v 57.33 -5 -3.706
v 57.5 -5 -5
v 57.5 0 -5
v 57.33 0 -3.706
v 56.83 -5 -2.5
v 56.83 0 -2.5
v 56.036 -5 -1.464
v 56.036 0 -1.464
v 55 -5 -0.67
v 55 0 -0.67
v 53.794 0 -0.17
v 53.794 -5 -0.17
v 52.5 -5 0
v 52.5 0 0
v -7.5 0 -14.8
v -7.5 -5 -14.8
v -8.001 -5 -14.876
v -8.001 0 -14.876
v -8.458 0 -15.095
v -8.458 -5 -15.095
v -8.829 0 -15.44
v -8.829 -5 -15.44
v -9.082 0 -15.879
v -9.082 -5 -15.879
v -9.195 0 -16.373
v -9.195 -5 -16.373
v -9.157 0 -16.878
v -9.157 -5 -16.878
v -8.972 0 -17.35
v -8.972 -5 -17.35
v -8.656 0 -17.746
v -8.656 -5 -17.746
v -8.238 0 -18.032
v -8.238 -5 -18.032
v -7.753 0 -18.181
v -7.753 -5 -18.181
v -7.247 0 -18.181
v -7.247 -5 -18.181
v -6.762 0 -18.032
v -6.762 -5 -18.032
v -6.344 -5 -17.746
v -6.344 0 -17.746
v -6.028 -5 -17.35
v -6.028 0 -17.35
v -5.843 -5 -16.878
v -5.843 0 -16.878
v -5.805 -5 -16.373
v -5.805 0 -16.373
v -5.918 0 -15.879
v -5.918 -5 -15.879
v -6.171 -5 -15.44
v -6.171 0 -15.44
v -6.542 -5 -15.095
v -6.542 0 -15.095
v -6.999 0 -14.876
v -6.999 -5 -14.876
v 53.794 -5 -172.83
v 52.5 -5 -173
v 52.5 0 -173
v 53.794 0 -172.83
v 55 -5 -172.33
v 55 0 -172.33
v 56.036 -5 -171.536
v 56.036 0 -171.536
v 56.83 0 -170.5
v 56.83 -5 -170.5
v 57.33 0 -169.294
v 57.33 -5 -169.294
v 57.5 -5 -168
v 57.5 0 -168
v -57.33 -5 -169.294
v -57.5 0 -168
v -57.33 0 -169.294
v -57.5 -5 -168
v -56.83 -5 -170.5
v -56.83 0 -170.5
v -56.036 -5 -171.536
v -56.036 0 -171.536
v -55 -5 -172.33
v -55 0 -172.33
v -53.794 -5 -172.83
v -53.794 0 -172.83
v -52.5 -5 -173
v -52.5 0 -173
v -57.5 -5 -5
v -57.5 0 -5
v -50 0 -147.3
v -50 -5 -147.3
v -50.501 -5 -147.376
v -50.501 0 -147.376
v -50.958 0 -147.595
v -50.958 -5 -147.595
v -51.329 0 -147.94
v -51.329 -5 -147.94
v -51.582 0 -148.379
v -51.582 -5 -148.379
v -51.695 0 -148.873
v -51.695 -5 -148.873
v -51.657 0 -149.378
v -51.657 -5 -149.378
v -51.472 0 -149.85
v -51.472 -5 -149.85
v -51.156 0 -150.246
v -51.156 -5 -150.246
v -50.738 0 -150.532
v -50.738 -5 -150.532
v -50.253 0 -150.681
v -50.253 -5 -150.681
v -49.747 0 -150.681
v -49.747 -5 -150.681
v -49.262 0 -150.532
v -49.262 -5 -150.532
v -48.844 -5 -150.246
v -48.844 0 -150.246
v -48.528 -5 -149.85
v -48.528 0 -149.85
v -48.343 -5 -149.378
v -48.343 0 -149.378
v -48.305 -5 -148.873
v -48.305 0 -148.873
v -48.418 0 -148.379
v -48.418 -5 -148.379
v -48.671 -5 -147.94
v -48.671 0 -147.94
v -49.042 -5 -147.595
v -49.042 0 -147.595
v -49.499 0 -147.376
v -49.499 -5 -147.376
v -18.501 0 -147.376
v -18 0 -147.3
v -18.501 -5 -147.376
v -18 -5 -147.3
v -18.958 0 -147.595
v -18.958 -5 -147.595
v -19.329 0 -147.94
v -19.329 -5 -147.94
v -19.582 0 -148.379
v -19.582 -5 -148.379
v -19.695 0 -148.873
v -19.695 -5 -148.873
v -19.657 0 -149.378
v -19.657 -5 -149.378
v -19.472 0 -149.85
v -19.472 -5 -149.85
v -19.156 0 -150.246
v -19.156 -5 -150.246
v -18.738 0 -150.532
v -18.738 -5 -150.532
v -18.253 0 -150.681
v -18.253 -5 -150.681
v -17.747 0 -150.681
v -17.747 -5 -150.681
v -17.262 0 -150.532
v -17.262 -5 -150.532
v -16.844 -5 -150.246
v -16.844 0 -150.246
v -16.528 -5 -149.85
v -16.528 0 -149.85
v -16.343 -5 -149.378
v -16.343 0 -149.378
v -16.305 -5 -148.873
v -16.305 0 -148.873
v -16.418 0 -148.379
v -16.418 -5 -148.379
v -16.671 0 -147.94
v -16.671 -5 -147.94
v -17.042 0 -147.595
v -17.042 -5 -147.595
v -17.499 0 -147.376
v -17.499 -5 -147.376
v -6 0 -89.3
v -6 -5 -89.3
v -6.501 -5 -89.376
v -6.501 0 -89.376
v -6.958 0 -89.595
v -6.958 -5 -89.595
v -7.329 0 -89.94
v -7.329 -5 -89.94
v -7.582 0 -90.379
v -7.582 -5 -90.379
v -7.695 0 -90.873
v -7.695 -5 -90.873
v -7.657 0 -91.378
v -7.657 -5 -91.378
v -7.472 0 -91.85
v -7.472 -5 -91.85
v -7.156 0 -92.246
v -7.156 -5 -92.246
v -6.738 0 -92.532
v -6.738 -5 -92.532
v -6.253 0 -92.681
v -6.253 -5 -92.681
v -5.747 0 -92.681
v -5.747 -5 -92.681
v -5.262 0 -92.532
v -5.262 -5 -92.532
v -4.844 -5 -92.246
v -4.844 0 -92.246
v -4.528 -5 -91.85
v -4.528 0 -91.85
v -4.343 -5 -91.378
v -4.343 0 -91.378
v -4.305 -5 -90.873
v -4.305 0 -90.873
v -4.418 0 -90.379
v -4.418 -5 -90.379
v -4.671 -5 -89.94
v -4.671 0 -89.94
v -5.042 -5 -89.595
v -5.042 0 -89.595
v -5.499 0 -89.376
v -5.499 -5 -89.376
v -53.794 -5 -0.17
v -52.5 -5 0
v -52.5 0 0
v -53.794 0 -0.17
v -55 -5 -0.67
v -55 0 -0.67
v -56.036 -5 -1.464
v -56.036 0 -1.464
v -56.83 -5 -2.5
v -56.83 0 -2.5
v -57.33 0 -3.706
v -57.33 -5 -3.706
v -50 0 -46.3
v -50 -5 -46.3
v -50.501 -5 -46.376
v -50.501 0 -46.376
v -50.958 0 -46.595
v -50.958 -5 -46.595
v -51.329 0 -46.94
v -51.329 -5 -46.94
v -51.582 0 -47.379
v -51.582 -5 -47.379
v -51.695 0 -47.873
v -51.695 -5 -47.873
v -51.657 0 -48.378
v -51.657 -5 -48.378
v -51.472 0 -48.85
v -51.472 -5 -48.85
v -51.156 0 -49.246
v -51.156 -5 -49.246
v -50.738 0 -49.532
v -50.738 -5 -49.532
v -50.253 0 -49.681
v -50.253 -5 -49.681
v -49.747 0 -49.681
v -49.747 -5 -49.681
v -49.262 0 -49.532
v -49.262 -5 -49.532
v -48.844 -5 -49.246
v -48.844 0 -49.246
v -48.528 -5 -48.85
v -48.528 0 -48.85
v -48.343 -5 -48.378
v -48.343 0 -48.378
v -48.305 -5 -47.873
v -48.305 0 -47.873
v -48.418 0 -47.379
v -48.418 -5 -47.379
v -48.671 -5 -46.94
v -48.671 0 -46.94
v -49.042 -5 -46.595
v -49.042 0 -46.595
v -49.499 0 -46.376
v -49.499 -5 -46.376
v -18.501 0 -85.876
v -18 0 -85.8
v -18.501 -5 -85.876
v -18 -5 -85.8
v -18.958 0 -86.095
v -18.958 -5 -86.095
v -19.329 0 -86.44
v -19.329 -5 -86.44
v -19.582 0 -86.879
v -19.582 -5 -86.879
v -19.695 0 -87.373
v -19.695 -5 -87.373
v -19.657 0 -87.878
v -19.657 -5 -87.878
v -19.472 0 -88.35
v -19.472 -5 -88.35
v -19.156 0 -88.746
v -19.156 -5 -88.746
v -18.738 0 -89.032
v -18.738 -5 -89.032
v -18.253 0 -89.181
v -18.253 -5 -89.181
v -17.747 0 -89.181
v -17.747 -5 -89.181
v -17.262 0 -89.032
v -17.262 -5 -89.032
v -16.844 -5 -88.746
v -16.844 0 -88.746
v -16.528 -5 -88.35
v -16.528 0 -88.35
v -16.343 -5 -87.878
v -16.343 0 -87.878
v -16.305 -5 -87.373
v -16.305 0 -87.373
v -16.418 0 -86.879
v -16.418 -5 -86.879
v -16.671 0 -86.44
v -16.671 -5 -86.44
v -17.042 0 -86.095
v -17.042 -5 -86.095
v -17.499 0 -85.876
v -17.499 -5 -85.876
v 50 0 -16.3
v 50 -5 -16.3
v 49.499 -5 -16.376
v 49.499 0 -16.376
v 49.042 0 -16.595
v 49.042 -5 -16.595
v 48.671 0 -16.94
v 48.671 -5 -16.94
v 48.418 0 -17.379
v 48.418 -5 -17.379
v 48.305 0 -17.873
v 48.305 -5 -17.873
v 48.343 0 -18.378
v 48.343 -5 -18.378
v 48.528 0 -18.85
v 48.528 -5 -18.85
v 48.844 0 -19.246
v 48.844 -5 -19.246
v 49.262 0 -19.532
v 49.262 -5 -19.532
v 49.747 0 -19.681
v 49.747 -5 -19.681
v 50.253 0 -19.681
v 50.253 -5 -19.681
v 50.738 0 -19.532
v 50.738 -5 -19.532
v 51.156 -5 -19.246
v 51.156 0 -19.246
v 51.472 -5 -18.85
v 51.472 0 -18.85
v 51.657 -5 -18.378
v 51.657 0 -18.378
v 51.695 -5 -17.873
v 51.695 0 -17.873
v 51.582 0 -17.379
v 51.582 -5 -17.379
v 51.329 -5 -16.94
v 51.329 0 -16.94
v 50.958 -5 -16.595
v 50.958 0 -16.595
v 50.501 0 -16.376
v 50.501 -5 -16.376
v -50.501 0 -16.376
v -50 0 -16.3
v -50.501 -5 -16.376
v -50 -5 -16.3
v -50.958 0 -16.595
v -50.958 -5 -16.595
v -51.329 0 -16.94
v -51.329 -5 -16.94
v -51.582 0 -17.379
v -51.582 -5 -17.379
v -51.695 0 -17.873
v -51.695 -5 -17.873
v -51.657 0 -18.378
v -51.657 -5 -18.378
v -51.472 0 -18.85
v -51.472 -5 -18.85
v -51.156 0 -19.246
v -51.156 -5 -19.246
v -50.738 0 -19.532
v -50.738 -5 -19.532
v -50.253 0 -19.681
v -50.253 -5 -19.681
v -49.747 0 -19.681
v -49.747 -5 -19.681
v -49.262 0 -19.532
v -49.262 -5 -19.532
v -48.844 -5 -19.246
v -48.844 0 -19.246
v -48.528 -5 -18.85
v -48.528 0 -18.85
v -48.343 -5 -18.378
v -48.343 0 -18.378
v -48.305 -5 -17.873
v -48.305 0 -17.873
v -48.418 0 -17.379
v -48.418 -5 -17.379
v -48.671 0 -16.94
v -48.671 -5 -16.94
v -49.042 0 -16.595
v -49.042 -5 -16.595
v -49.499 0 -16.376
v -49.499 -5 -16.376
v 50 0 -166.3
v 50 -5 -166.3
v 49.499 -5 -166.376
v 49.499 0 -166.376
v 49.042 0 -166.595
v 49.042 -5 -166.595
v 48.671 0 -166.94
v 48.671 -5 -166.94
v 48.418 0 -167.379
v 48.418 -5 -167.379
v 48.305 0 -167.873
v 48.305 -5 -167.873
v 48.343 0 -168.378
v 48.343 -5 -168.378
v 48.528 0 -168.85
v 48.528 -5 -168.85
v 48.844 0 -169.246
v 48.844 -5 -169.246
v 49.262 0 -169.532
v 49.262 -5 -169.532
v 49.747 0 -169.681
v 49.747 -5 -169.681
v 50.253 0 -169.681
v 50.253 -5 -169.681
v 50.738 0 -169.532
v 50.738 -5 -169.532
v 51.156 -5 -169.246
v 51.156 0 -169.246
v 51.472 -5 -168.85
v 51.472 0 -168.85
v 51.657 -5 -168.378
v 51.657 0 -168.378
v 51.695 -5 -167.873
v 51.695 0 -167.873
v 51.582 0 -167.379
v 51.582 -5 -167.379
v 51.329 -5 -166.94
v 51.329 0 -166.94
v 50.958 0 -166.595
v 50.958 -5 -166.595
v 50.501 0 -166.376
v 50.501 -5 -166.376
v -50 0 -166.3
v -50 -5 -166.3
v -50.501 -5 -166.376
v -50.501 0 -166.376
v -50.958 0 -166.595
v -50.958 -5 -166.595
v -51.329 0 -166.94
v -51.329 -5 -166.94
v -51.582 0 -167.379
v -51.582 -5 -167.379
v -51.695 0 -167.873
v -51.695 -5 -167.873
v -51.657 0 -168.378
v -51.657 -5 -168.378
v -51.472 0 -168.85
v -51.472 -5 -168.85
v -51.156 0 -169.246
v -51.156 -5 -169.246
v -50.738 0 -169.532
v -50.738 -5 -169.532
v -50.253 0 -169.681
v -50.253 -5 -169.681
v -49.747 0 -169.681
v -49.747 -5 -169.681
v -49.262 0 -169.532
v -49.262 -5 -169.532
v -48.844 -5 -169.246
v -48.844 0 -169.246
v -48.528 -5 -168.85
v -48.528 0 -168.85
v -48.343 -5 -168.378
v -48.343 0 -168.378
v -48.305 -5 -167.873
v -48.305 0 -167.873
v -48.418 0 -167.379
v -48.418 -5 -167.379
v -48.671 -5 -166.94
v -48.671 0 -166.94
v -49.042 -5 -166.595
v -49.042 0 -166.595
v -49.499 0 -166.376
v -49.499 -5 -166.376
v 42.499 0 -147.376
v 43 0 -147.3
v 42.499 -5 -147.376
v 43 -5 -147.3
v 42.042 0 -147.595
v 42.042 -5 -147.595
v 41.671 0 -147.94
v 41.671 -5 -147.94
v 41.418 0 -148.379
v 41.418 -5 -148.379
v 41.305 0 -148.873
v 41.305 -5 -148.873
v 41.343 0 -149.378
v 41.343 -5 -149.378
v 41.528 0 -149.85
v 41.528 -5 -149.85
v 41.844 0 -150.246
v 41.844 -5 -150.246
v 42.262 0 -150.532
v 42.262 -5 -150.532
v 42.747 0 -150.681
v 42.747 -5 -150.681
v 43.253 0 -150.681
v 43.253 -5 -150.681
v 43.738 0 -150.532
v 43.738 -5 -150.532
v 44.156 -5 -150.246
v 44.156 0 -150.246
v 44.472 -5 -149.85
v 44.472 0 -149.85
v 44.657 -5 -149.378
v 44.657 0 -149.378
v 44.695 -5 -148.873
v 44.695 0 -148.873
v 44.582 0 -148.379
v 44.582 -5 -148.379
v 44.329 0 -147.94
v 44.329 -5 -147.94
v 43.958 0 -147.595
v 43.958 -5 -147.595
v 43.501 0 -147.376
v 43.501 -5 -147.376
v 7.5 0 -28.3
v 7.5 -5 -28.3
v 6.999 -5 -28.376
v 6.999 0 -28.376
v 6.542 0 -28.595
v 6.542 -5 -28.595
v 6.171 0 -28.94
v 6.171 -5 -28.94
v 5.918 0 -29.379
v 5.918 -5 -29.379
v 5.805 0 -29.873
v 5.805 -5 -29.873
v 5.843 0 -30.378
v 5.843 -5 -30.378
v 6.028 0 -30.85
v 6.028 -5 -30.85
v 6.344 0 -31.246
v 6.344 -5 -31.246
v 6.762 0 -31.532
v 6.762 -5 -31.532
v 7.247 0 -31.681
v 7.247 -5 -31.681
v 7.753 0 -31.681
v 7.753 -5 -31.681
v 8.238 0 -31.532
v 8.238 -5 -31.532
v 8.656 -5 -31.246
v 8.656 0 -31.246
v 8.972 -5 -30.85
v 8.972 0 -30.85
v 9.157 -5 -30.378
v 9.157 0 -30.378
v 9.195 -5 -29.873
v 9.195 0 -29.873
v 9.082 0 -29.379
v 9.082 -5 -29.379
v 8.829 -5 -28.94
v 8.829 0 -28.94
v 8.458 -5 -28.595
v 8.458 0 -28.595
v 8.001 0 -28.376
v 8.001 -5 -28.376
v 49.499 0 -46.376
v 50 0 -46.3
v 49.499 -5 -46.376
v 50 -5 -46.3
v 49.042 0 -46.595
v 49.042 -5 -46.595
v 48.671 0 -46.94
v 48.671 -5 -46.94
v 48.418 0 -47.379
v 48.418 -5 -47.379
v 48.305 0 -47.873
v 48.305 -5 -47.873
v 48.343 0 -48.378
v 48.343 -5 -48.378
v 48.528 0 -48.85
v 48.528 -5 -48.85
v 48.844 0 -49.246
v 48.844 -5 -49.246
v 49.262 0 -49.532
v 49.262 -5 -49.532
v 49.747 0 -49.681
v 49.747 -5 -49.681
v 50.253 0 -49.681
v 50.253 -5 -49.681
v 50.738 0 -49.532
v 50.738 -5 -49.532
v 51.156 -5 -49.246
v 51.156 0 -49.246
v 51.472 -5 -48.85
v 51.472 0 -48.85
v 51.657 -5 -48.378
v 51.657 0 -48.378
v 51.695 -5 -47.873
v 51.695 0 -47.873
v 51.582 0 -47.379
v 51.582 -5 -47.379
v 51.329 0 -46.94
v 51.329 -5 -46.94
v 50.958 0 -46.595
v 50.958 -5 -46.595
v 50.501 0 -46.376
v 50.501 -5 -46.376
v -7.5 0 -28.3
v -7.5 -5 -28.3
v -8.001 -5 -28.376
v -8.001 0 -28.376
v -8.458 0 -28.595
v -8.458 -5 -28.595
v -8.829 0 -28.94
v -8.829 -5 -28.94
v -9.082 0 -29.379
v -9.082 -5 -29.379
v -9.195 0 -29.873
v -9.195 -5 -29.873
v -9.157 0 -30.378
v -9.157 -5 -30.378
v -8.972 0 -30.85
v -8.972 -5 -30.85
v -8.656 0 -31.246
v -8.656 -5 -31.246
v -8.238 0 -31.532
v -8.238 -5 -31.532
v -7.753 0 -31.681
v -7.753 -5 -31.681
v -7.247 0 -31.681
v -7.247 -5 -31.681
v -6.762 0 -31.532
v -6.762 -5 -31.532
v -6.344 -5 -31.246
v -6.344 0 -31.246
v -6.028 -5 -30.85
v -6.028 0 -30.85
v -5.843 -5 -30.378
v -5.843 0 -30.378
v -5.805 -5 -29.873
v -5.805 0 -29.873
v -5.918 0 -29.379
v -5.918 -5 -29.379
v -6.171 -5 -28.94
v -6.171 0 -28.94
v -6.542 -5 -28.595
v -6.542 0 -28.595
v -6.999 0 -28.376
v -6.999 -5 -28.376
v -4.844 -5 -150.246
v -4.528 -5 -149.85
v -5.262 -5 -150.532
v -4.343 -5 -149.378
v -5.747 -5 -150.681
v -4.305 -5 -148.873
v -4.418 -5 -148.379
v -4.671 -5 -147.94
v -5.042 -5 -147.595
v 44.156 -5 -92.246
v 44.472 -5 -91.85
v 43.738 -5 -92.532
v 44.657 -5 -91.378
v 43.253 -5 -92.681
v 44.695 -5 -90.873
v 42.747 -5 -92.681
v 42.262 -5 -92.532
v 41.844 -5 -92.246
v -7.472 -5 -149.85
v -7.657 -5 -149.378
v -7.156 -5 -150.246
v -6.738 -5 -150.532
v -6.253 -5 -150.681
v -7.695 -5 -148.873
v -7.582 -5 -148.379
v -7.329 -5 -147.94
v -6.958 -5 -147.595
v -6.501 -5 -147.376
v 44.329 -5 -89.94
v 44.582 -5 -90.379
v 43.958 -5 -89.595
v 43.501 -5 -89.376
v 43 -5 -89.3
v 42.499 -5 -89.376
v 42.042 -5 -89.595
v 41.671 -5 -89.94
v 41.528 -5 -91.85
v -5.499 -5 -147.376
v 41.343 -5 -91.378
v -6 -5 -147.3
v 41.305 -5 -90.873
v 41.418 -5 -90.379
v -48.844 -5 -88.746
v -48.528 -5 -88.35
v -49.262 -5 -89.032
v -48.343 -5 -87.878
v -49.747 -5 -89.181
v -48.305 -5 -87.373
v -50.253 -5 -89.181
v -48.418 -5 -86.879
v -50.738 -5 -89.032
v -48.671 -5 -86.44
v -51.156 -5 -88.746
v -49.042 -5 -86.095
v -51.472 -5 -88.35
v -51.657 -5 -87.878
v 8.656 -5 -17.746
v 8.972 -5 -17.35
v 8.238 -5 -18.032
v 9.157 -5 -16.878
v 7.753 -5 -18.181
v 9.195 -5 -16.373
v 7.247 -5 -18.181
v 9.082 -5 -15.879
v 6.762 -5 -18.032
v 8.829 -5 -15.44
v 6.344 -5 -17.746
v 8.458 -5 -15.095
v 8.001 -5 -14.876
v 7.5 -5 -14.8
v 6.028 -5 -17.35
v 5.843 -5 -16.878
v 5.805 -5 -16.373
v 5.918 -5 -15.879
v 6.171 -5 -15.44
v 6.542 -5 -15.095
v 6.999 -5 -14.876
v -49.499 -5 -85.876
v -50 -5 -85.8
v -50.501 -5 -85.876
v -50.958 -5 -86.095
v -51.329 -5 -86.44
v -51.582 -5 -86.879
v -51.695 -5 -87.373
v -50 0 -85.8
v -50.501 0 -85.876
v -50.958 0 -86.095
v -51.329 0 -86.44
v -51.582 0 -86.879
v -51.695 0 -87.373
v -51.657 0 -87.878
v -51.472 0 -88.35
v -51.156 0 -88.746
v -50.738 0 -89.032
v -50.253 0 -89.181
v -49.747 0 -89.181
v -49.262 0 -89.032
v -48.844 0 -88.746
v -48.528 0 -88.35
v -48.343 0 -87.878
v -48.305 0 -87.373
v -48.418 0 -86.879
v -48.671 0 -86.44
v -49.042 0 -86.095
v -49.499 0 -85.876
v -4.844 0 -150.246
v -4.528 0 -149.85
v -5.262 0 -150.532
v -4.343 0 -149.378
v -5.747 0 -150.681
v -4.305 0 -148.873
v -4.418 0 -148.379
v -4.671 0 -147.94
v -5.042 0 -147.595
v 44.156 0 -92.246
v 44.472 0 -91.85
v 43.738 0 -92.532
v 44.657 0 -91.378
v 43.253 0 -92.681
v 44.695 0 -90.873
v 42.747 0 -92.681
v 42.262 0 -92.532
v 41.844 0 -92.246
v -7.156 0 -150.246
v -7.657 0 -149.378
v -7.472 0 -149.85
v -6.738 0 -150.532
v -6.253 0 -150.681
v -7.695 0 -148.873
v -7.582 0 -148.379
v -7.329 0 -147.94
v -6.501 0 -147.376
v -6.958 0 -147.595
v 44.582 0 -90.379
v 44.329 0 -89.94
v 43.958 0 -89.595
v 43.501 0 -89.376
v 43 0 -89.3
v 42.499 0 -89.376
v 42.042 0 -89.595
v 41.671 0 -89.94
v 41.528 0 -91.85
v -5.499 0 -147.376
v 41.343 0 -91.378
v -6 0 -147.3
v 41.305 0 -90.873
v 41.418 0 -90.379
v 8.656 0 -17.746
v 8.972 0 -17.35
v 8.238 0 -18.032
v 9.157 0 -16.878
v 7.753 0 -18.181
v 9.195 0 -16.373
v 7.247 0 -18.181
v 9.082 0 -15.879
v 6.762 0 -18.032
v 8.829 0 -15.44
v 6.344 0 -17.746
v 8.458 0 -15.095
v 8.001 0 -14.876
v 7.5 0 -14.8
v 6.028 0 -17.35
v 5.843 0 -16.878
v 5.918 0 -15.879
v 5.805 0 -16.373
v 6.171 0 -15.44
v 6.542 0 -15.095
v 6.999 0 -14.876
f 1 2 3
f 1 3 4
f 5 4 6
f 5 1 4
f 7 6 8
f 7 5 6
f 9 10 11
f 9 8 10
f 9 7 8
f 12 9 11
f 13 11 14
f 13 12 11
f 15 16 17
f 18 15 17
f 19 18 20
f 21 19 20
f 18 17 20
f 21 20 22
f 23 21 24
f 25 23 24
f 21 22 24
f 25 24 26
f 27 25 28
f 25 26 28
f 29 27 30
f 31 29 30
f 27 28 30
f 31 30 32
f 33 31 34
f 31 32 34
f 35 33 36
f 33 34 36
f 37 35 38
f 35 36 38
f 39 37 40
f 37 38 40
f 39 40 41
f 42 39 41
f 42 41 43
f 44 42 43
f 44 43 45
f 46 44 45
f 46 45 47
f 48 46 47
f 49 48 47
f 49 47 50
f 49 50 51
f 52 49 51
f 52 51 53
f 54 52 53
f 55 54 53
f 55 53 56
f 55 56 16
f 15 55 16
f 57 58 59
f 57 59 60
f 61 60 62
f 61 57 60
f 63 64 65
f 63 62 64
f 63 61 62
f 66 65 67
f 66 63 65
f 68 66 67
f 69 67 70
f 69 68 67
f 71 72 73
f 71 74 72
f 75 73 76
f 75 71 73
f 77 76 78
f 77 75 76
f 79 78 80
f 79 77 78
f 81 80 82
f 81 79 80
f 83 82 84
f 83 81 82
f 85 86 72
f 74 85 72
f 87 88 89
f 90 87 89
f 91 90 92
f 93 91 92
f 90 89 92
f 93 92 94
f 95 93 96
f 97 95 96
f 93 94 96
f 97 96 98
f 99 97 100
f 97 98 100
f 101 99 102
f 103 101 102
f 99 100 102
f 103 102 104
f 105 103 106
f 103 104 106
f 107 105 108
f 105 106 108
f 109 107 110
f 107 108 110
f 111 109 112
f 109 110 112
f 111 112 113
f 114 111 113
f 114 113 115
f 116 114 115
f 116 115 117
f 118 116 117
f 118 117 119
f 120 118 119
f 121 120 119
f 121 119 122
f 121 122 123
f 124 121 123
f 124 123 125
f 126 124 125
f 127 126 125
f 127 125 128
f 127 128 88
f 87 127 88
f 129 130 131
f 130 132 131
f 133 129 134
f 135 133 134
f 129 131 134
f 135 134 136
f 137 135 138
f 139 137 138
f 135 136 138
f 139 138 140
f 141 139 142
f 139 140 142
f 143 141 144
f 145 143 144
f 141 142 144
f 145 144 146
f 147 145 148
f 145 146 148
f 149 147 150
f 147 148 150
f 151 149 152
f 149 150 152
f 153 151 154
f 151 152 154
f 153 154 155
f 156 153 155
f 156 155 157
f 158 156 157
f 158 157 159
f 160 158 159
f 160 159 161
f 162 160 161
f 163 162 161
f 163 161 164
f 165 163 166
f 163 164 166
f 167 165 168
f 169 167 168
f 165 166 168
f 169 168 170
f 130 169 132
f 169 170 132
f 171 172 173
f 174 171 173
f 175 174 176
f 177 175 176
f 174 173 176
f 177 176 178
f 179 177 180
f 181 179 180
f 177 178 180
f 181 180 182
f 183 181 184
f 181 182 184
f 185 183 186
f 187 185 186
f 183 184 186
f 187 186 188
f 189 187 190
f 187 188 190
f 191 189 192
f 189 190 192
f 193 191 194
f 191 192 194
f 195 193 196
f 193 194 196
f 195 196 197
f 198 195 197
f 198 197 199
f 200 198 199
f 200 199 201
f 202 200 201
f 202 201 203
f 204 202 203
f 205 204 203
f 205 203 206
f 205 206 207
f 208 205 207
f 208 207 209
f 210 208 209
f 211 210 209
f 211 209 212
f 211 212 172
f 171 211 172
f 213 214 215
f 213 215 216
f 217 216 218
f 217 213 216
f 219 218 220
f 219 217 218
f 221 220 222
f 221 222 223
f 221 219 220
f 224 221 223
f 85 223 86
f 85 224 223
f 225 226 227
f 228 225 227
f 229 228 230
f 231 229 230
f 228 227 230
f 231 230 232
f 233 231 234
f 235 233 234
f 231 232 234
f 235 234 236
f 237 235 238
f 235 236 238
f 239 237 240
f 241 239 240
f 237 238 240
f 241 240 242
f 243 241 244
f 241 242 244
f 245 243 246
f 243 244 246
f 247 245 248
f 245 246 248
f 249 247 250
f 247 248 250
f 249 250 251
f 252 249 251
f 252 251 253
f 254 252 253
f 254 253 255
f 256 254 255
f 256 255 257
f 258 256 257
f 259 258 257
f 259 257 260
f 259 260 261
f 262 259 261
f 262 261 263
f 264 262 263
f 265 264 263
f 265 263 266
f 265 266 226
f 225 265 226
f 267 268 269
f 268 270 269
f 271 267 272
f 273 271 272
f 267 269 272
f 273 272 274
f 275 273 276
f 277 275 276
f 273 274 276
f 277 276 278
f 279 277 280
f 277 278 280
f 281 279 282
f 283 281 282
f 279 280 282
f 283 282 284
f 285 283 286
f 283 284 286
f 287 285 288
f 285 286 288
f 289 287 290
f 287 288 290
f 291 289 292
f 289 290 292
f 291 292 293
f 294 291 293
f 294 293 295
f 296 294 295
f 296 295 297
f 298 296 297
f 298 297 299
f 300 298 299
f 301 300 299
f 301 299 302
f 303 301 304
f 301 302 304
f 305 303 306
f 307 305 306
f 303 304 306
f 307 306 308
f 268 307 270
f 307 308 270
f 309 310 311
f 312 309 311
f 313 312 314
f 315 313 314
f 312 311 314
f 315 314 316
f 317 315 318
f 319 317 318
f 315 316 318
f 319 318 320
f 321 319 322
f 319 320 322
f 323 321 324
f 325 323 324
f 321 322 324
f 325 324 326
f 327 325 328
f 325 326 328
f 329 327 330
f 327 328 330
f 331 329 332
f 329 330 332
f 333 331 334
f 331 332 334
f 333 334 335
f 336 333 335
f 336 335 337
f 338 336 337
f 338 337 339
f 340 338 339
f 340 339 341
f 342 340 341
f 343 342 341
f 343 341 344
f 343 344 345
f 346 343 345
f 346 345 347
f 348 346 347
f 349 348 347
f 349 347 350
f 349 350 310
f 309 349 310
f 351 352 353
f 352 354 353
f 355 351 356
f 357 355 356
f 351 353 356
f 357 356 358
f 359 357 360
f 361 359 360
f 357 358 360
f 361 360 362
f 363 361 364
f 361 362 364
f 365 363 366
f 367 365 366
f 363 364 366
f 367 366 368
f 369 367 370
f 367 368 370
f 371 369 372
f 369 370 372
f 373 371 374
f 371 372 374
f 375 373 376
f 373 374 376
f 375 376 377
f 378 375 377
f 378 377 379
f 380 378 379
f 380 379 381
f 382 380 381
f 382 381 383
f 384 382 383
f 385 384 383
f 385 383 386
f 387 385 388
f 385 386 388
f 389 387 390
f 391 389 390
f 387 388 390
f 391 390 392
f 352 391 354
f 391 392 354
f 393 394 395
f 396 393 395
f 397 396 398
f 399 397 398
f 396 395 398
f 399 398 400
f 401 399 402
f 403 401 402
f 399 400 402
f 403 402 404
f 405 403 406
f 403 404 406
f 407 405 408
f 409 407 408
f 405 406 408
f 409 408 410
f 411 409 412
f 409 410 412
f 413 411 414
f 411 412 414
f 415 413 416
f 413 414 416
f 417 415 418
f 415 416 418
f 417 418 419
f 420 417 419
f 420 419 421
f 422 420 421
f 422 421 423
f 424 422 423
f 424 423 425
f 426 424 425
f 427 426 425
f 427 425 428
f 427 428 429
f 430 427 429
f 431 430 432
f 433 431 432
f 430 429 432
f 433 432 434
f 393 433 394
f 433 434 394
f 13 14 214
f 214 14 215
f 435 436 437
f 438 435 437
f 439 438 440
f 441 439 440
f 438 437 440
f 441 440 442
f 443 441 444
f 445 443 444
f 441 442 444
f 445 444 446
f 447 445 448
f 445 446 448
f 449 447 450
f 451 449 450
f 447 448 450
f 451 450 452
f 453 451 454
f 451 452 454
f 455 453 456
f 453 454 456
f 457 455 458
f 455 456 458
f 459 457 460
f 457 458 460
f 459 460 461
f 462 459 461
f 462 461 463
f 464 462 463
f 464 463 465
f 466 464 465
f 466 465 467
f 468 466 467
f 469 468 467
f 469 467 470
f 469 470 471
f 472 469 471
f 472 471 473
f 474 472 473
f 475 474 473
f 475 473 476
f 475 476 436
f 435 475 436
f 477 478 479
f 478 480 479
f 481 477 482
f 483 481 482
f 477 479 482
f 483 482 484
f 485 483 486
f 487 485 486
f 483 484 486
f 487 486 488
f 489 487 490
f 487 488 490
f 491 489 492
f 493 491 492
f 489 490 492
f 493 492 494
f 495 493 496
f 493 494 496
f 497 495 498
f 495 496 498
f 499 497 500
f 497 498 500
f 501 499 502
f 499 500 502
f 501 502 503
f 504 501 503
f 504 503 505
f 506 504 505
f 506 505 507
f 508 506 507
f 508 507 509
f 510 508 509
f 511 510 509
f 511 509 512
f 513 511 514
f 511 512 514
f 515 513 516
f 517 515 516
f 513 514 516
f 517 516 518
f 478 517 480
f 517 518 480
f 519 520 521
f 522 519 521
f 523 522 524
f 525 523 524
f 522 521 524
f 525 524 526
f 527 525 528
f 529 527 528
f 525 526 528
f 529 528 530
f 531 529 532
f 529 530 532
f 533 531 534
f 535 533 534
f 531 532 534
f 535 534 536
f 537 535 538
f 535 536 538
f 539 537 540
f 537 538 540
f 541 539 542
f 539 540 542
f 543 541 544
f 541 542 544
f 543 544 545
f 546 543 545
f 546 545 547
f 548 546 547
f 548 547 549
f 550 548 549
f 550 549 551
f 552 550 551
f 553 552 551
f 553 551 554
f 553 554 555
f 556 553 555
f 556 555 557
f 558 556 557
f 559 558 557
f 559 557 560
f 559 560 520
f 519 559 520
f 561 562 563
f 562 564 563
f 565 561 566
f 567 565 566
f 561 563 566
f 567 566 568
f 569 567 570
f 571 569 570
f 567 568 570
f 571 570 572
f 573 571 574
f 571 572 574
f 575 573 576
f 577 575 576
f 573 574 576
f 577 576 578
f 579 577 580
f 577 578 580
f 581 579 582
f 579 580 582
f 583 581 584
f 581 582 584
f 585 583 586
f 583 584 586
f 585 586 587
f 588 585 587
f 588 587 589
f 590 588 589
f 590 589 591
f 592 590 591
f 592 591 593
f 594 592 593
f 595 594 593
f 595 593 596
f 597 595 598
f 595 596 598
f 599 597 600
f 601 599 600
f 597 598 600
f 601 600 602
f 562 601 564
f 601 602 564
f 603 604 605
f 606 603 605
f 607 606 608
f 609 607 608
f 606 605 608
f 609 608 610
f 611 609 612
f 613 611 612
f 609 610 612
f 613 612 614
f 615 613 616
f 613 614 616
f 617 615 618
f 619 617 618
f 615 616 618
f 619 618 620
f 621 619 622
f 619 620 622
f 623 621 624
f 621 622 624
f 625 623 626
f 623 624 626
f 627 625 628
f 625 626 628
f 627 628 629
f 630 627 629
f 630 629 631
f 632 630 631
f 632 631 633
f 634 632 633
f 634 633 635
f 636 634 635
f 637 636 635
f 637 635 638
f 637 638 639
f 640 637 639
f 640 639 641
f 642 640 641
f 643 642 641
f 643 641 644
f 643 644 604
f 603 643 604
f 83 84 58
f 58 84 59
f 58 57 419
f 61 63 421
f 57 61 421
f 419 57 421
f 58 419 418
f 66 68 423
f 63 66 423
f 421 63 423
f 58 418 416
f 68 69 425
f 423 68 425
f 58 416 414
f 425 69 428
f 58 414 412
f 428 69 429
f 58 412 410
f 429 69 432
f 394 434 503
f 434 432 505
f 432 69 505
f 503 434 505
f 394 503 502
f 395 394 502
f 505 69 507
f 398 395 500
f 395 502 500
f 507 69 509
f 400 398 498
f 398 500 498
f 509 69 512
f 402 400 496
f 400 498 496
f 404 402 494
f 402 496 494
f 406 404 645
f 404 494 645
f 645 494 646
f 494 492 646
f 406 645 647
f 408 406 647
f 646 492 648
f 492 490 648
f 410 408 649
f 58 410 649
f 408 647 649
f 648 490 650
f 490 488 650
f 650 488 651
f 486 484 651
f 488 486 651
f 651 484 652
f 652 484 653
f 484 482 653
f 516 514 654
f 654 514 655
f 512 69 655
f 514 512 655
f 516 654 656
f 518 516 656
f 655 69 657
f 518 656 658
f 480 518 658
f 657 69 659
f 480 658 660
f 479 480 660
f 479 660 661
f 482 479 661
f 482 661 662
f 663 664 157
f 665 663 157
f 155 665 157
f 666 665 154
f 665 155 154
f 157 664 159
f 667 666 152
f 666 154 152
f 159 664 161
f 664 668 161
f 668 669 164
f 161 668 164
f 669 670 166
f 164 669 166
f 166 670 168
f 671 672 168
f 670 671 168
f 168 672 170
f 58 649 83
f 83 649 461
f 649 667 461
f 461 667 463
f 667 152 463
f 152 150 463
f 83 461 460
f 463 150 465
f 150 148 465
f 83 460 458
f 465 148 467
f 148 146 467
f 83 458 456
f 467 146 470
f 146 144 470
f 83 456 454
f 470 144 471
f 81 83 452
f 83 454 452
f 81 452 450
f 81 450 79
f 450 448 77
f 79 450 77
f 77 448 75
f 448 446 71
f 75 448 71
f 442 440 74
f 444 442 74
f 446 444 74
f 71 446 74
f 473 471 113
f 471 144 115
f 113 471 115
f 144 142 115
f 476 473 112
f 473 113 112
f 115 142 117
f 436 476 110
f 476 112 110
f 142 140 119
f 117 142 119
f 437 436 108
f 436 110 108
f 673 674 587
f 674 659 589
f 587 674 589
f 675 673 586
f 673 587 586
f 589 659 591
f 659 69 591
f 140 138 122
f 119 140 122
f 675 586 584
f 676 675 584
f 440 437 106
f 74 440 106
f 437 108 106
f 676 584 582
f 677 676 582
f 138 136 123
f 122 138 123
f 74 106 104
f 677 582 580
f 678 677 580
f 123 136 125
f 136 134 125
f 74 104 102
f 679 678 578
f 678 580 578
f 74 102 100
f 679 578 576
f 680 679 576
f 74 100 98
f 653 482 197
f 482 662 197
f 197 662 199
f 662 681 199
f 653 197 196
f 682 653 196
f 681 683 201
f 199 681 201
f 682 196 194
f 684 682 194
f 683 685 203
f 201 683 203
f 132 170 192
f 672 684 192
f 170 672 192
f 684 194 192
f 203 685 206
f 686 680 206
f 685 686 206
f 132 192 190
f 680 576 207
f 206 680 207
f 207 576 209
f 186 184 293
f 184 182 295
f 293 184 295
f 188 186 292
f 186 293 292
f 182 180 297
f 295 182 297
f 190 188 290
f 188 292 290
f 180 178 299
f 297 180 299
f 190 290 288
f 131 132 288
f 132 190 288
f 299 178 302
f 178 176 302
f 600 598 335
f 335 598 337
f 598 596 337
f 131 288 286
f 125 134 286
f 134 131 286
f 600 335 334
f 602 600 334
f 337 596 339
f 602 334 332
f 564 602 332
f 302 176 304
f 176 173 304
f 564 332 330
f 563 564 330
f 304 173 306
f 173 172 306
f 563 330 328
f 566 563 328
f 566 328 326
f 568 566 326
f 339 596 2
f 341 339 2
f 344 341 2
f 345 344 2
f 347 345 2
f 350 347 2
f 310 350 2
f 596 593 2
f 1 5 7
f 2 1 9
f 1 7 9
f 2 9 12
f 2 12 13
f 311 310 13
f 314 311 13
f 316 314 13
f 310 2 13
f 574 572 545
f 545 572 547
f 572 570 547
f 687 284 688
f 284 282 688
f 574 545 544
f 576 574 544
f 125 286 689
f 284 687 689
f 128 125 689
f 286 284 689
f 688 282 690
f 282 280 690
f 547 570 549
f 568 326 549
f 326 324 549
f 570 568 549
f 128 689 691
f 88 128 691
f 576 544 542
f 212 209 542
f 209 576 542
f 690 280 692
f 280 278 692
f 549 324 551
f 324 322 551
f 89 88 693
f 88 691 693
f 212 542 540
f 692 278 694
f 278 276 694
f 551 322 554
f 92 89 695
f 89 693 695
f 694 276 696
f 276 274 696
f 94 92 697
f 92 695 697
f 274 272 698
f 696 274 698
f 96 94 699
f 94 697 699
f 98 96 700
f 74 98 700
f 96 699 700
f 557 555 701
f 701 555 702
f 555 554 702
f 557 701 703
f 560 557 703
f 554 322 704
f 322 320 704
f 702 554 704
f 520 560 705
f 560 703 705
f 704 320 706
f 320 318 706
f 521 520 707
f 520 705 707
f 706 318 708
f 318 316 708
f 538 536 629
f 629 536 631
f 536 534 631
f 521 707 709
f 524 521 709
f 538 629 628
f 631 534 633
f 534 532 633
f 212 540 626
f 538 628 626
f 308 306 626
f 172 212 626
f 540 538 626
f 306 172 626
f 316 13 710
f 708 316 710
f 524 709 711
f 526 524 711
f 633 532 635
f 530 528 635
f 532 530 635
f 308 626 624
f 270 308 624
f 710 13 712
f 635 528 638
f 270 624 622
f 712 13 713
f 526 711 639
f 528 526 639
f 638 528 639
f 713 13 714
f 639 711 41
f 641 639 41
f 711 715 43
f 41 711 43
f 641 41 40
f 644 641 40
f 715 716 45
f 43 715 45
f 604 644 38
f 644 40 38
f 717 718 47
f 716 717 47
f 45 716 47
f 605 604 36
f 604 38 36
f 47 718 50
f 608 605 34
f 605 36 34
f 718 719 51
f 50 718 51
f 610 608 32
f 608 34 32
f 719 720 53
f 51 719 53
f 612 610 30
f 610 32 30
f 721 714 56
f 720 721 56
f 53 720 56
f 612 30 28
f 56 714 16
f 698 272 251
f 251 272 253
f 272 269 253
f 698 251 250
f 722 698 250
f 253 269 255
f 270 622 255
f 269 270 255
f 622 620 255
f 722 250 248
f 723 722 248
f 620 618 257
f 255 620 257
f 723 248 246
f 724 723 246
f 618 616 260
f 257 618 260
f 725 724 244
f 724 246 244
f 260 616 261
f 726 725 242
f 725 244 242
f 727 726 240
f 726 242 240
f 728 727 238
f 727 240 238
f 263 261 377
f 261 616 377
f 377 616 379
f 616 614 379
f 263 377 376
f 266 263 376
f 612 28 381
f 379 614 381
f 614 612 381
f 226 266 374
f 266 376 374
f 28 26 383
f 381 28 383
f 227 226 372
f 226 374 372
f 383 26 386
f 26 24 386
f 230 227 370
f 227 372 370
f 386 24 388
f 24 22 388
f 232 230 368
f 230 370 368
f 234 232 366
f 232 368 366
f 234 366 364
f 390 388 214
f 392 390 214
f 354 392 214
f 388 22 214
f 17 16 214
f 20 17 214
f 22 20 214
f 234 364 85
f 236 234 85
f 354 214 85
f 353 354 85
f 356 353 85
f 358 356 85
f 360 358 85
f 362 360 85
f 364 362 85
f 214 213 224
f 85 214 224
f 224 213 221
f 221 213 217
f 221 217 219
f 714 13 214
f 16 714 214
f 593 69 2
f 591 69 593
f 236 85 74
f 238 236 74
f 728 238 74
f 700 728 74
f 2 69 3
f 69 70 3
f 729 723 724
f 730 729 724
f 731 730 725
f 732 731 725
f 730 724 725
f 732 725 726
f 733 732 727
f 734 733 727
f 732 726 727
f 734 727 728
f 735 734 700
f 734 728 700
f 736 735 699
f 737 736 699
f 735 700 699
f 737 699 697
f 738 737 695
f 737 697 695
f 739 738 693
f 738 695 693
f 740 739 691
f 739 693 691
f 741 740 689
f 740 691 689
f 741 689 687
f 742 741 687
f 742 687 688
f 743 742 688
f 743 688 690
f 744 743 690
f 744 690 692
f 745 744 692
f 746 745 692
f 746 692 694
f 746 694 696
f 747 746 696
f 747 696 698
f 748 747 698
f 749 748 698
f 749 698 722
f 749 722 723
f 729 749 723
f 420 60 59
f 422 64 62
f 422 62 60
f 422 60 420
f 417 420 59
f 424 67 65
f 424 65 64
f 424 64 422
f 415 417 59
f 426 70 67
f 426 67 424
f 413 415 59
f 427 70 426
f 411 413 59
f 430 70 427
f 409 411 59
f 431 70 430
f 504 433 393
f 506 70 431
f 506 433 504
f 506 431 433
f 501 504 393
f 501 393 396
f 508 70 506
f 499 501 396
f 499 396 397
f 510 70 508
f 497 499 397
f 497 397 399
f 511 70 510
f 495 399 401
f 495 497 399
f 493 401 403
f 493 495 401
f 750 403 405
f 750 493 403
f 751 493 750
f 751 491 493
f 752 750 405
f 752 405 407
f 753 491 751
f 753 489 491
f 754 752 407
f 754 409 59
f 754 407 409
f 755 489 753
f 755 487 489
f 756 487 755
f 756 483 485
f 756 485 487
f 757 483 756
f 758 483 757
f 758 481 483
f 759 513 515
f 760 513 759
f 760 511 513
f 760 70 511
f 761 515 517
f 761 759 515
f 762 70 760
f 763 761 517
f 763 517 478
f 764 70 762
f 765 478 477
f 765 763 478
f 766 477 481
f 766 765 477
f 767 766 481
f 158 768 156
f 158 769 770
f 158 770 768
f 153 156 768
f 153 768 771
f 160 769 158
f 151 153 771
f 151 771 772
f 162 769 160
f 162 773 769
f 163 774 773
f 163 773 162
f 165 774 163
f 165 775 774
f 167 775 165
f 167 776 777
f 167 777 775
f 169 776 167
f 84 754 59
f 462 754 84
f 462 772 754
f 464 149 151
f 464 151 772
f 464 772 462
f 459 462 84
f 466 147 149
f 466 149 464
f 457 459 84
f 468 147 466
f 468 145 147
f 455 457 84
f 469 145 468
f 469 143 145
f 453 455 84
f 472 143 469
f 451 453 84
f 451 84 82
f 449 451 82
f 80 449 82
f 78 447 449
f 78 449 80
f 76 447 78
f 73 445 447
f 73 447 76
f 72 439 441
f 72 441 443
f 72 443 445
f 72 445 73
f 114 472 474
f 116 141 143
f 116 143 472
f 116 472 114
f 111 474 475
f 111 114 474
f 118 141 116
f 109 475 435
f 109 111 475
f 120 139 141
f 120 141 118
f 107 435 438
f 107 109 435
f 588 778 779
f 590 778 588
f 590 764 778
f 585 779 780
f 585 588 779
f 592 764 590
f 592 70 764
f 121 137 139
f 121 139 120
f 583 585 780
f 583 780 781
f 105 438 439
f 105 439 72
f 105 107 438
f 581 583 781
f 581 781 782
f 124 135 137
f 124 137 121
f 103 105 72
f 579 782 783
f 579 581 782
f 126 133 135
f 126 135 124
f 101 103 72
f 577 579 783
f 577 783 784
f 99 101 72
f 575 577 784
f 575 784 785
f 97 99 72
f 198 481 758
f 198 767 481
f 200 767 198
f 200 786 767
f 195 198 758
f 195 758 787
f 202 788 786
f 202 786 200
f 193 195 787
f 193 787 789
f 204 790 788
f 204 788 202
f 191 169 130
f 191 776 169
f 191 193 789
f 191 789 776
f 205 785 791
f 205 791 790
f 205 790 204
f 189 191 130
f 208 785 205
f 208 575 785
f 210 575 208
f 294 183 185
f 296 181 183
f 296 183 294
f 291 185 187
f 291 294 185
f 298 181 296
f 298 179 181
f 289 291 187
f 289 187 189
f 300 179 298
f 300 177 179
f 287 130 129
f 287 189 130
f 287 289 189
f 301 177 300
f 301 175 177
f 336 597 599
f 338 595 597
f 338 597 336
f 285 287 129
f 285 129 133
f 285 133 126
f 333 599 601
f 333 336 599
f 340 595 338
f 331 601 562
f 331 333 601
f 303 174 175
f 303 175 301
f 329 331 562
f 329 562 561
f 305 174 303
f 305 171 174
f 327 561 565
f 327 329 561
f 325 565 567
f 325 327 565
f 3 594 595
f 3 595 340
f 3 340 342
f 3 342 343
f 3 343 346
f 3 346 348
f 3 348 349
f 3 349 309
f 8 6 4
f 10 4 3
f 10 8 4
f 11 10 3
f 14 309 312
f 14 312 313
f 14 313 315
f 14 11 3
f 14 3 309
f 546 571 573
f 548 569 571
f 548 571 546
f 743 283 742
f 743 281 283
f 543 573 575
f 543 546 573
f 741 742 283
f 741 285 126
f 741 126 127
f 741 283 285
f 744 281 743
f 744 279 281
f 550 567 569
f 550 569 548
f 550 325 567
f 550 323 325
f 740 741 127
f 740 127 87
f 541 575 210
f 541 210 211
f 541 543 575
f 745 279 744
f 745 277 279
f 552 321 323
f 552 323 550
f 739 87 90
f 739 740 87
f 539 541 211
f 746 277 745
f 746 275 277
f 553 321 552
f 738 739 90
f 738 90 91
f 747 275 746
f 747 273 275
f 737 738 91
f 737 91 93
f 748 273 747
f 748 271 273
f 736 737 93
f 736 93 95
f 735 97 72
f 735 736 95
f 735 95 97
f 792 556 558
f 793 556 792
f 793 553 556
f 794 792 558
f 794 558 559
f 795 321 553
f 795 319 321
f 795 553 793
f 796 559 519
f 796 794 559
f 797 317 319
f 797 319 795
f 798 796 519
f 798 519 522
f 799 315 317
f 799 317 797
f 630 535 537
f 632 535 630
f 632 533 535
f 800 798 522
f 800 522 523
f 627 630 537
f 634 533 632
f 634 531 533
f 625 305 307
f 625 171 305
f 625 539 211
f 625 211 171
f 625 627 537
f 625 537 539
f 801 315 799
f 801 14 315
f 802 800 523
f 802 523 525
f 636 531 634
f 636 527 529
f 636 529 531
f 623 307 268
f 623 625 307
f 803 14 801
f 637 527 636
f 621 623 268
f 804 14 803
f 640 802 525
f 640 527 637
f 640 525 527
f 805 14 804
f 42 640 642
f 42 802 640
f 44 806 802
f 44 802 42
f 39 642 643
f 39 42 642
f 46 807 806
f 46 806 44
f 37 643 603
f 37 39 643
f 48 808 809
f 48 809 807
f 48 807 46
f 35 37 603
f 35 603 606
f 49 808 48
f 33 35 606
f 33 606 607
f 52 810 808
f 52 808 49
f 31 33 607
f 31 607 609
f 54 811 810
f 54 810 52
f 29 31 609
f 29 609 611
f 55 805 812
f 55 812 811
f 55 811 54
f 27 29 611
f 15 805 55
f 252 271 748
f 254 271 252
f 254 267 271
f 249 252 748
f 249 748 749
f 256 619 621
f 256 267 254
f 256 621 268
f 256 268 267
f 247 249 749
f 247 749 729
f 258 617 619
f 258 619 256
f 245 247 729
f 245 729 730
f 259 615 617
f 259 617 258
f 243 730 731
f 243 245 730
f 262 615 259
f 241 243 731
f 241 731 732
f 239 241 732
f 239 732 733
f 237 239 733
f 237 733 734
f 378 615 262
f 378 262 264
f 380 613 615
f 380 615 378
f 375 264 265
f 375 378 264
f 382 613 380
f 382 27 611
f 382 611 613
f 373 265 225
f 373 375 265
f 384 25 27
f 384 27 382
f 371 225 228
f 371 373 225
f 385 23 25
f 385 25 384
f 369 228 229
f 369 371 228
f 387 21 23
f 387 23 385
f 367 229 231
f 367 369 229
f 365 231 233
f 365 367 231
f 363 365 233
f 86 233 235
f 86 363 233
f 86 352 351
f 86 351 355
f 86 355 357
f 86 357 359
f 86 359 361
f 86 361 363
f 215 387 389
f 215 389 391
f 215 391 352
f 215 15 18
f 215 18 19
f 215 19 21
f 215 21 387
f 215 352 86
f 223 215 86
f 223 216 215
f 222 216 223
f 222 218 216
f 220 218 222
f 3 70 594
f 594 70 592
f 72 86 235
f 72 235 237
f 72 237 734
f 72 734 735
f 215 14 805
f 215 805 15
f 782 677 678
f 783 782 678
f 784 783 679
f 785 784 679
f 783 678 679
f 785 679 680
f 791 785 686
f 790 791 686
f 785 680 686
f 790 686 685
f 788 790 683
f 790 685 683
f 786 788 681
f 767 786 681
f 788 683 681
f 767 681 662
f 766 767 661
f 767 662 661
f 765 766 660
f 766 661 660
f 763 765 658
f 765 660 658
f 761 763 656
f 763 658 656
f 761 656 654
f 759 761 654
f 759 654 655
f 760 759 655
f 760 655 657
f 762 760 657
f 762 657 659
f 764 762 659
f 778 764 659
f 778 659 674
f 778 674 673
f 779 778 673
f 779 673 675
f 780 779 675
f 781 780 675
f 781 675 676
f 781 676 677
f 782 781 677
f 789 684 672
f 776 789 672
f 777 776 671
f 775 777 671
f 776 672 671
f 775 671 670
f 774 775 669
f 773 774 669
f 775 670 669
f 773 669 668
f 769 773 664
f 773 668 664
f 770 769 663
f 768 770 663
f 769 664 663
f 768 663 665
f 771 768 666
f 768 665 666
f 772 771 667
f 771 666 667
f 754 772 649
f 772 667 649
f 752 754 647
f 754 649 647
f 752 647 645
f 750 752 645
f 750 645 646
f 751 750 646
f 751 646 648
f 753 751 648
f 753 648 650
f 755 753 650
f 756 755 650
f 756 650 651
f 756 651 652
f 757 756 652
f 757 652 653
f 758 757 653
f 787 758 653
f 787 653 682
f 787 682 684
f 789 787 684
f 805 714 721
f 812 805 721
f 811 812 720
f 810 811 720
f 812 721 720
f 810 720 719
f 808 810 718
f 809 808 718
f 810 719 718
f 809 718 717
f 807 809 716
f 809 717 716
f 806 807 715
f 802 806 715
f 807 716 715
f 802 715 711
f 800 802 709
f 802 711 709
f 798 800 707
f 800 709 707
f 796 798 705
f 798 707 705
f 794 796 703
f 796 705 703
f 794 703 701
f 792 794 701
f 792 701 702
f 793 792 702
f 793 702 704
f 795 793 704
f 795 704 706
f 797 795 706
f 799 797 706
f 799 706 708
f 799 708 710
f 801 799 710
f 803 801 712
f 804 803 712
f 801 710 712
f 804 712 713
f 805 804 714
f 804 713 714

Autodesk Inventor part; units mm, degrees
ref_plane "YZ Plane" through (0, 0, 0) normal (1, 0, 0) x (0, 1, 0)
ref_plane "XZ Plane" through (0, 0, 0) normal (0, 1, 0) x (-1, 0, 0)
ref_plane "XY Plane" through (0, 0, 0) normal (0, 0, 1) x (1, 0, 0)
sketch "Sketch1" plane through (0, 0, 0) normal (0, 1, 0) x (-1, 0, 0)
  line L0 (57.5, -173) -> (57.5, -173) construction
  line L1 (-57.5, -173) -> (-57.5, 0) construction
  line L2 (-57.5, 0) -> (57.5, 0)
  line L3 (57.5, 0) -> (57.5, -173) construction
  line L4 (80.5, 0) -> (-80.5, 0) construction
  line L5 (0, -207.6) -> (0, 34.6) construction
  line L6 (57.5, -173) -> (-57.5, -173)
  line L7 (-57.5, -173) -> (-57.5, -173) construction
  line L8 (57.5, 0) -> (-55.1767, 0)
  line L9 (57.5, -40) -> (-57.5, -40) construction
  line L10 (-57.5, -40) -> (-57.5, 0)
  line L11 (-57.5, 0) -> (57.5, 0)
  line L12 (57.5, 0) -> (57.5, -40)
  line L13 (-57.5, -173) -> (-57.5, -40)
  line L14 (57.5, -173) -> (57.5, -40)
  point P0 (0, 0)
  dimension "width" = 115
  dimension "Length" = 173
  dimension "d2" = 115
  dimension "d112" = 40
extrude "Base" add sketch "Sketch1" against normal blind 5
sketch "Sketch11" plane through (0, 0, 0) normal (0, 1, 0) x (1, 0, 0)
  line L0 (0, 207.6) -> (0, -34.6) construction
  line L1 (-57.5, 0) -> (57.5, 0) construction
  line L2 (57.5, 173) -> (-57.5, 173) projected
  line L3 (-50, 18) -> (50, 18) construction
  line L4 (50, 18) -> (50, 48) construction
  line L5 (50, 48) -> (-50, 48) construction
  line L6 (-50, 48) -> (-50, 18) construction
  point P0 (0, 0)
  point P1 (50, 168)
  point P2 (-50, 168)
  dimension "d91" = 18
  dimension "d92" = 50
  dimension "d93" = 5
  dimension "d94" = 50
  dimension "d113" = 30
hole "Mounting Holes" at (50, 0, -18) at (-50, 0, -18) at (50, 0, -168) at (-50, 0, -168) at (-50, 0, -48) at (50, 0, -48) direction (0, -1, 0) diameter 3.4 depth 6
fillet "Fillet1" radius 5 4 edges at (-57.5, -2.5, 0) (57.5, -2.5, -173) (-57.5, -2.5, -173) (57.5, -2.5, 0)
sketch "Sketch12" plane through (0, 0, 0) normal (0, 1, 0) x (1, 0, 0)
  line L0 (-6, 149) -> (43, 149) construction
  line L1 (43, 149) -> (43, 91) construction
  line L2 (43, 91) -> (-6, 91) construction
  line L3 (-6, 91) -> (-6, 149) construction
  line L4 (-57.5, 168) -> (-57.5, 5) projected
  line L5 (0, 207.6) -> (0, -34.6) projected
  line L6 (-52.5, 0) -> (52.5, 0) projected
  circle A0 centre (-50, 48) radius 1.7 projected
  line L7 (52.5, 173) -> (-52.5, 173) projected
  circle A1 centre (50, 48) radius 1.7 projected
  circle A2 centre (50, 168) radius 1.7 projected
  point P0 (0, 0)
  point P1 (0, 0)
  point P2 (52.2987, 0)
  point P3 (-57.5, 40)
  point P4 (0, 0)
  dimension "d104" = 58
  dimension "d263" = 24
  dimension "d266" = 49
  dimension "d267" = 7
hole "RasPi Mounting Holes" at (-6, 0, -149) at (43, 0, -149) at (43, 0, -91) at (-6, 0, -91) direction (0, -1, 0) diameter 3.4 depth 6
sketch "Sketch15" plane through (0, 0, 0) normal (0, 1, 0) x (1, 0, 0)
  line L0 (-18, 149) -> (-18, 87.5) construction
  line L1 (-18, 87.5) -> (-50, 87.5) construction
  line L2 (-50, 87.5) -> (-50, 149) construction
  line L3 (-50, 149) -> (-18, 149) construction
  line L4 (-52.5, 0) -> (52.5, 0) projected
  circle A0 centre (43, 149) radius 1.7 projected
  circle A1 centre (50, 48) radius 1.7 projected
  circle A2 centre (-50, 48) radius 1.7 projected
  point P0 (0, 0)
  point P1 (0, 0)
  dimension "d122" = 32
  dimension "d123" = 61.5
hole "LM2596 Mounting Holes" at (-18, 0, -149) at (-18, 0, -87.5) at (-50, 0, -87.5) at (-50, 0, -149) direction (0, -1, 0) diameter 3.4 depth 6
sketch "Sketch16" plane through (0, 0, 0) normal (0, 1, 0) x (1, 0, 0)
  line L0 (-7.5, 16.5) -> (7.5, 16.5) construction
  line L1 (7.5, 16.5) -> (7.5, 30) construction
  line L2 (7.5, 30) -> (-7.5, 30) construction
  line L3 (-7.5, 30) -> (-7.5, 16.5) construction
  line L4 (52.5, 173) -> (-52.5, 173) projected
  line L5 (-52.5, 0) -> (52.5, 0) projected
  point P0 (0, 0)
  point P1 (0, 30)
  point P2 (0, 173)
  dimension "d132" = 15
  dimension "d133" = 13.5
  dimension "d264" = 16.5
hole "Camera Mount Mounting Holes" at (-7.5, 0, -30) at (-7.5, 0, -16.5) at (7.5, 0, -16.5) at (7.5, 0, -30) direction (0, -1, 0) diameter 3.4 depth 6
sketch "Sketch17" plane through (0, 0, 0) normal (0, 1, 0) x (1, 0, 0)
  spline S0 degree 4 poles (20.2958, 49.4851) (20.6789, 48.9084) (23.4396, 47.5095) (25.9197, 47.6138) (27.8901, 48.6422) (29.1867, 50.3145) (29.4114, 52.1793) (28.5047, 55.2295) (25.5201, 55.758) (20.7186, 56.8474) (23.8724, 60.2591) (26.3838, 58.5227) (28.1257, 57.2645) knots 0 0 0 0 0 0.20272 0.281354 0.355201 0.433006 0.519581 0.610324 0.697239 0.780233 1 1 1 1 1
  line L0 (28.1257, 57.2645) -> (29.7111, 59.2874)
  line L1 (20.2958, 49.4851) -> (21.6797, 51.6642)
  spline S1 degree 4 poles (21.6797, 51.6642) (22.294, 51.399) (22.8002, 50.5746) (25.5673, 49.8354) (26.8617, 51.423) (26.2496, 52.8197) (24.0458, 53.1534) (23.329, 53.4897) (21.3928, 54.1292) (20.3004, 55.4262) (19.7305, 56.5103) (20.0555, 59.7919) (23.1279, 61.9518) (27.765, 61.4454) (29.2944, 59.5103) (29.7111, 59.2874) knots 0 0 0 0 0 0.144957 0.205265 0.266901 0.324627 0.385746 0.449033 0.50901 0.575778 0.647334 0.728378 0.816759 1 1 1 1 1
  line L2 (19.0392, 48.0812) -> (19.0392, 61.1238)
  line L3 (19.0392, 61.1238) -> (16.3103, 61.1165)
  line L4 (16.3103, 61.1165) -> (16.3103, 57.2645)
  line L5 (16.3005, 50.6209) -> (16.3005, 54.6823)
  line L6 (16.3005, 54.6823) -> (13.9834, 54.6823)
  line L7 (16.3005, 50.6209) -> (13.9834, 50.6209)
  line L8 (19.0392, 48.0812) -> (13.9055, 48.0812)
  line L9 (16.3103, 57.2645) -> (13.9055, 57.2645)
  spline S2 degree 4 poles (13.9055, 48.0812) (12.4379, 47.8667) (9.7187, 48.6838) (8.9871, 53.4702) (10.0145, 55.7471) (11.812, 57.3277) (13.9055, 57.2645) knots 0 0 0 0 0 0.42418 0.584268 1 1 1 1 1
  spline S3 degree 4 poles (13.9834, 50.6209) (12.498, 50.3895) (10.979, 52.4191) (12.1531, 54.6206) (13.9834, 54.6823) knots 0 0 0 0 0 1 1 1 1 1
  line L10 (5.611, 51.8606) -> (5.611, 61.1378)
  line L11 (5.611, 61.1378) -> (2.2951, 61.1378)
  line L12 (2.2951, 61.1378) -> (2.2951, 60.9623)
  line L13 (2.2951, 60.9623) -> (2.2951, 57.2161)
  line L14 (2.2951, 57.2161) -> (0.5839, 57.2161)
  line L15 (0.5839, 57.2161) -> (-1.936, 61.1378)
  line L16 (-1.936, 61.1378) -> (-5.9376, 61.1378)
  line L17 (-5.9376, 61.1378) -> (-3.4177, 57.2161)
  line L18 (5.611, 51.8606) -> (2.2951, 51.8606)
  line L19 (2.2951, 51.8606) -> (2.2951, 53.8306)
  line L20 (2.2951, 53.8306) -> (-1.6405, 53.8306)
  line L21 (-1.6405, 53.8306) -> (-1.6405, 51.2415)
  line L22 (-1.6405, 51.2415) -> (5.611, 51.2415)
  line L23 (5.611, 51.2415) -> (5.611, 47.9336)
  line L24 (5.611, 47.9336) -> (-3.7057, 47.9336)
  line L25 (-5.0121, 49.3829) -> (-5.0121, 55.5531)
  arc A0 (-3.4177, 57.2161) -> (-5.0121, 55.5531) centre (-3.281, 55.4892) ccw
  arc A1 (-5.0121, 49.3829) -> (-3.7057, 47.9336) centre (-2.6718, 50.1788) ccw
  line L26 (-6.9039, 47.9336) -> (-10.2687, 47.9336)
  line L27 (-10.2687, 47.9336) -> (-10.2687, 61.1378)
  line L28 (-10.2687, 61.1378) -> (-6.9039, 61.1378)
  line L29 (-6.9039, 61.1378) -> (-6.9039, 47.9336)
  line L30 (-11.8026, 47.9336) -> (-11.8026, 51.2415)
  line L31 (-11.8026, 51.2415) -> (-15.1713, 51.2415)
  line L32 (-15.1713, 51.2415) -> (-15.1713, 61.1378)
  line L33 (-15.1713, 61.1378) -> (-18.4823, 61.1378)
  line L34 (-18.4823, 61.1378) -> (-18.4823, 47.9336)
  line L35 (-18.4823, 47.9336) -> (-11.8026, 47.9336)
  line L36 (-19.0962, 47.9336) -> (-19.0962, 51.2415)
  line L37 (-19.0962, 51.2415) -> (-21.5406, 51.2415)
  line L38 (-21.5406, 51.2415) -> (-23.787, 47.9336)
  line L39 (-23.787, 47.9336) -> (-19.0962, 47.9336)
  line L40 (-24.4617, 47.9274) -> (-24.4617, 61.1378)
  line L41 (-24.4617, 61.1378) -> (-27.7836, 61.1378)
  line L42 (-27.7836, 61.1378) -> (-27.7836, 47.9274)
  line L43 (-27.7836, 47.9274) -> (-24.4617, 47.9274)
  line L44 (-28.3589, 52.8456) -> (-28.3589, 56.1975)
  line L45 (-28.3589, 56.1975) -> (-30.851, 56.1975)
  line L46 (-30.851, 52.8456) -> (-28.3589, 52.8456)
  line L47 (-27.7836, 47.9274) -> (-27.7836, 51.2654)
  line L48 (-27.7836, 51.2654) -> (-32.8922, 51.2654)
  line L49 (-32.8922, 47.9274) -> (-27.7836, 47.9274)
  line L50 (-32.8922, 47.9274) -> (-35.0606, 51.2654)
  line L51 (-35.0606, 51.2654) -> (-32.8922, 51.2654)
  line L52 (-30.851, 52.8456) -> (-33.0635, 52.8734)
  line L53 (-33.0635, 52.8734) -> (-30.851, 56.1975)
  line L54 (-27.7836, 57.7985) -> (-35.0607, 57.7985)
  line L55 (-35.0607, 57.7985) -> (-32.8922, 61.1378)
  line L56 (-32.8922, 61.1378) -> (-27.7836, 61.1378)
  point P0 (21.8312, 48.4826)
  point P1 (24.6762, 47.7793)
  point P2 (27.8239, 48.7935)
  point P3 (29.2122, 52.0376)
  point P4 (25.048, 55.8974)
  point P5 (22.697, 57.0989)
  point P6 (22.9251, 58.2765)
  point P7 (24.696, 58.9116)
  point P8 (28.2025, 54.5741)
  point P9 (28.8947, 50.19)
  point P10 (26.5311, 48.0478)
  point P11 (22.4682, 51.1588)
  point P12 (23.9337, 50.486)
  point P13 (25.8462, 50.5785)
  point P14 (26.5371, 51.481)
  point P15 (26.0534, 52.5205)
  point P16 (24.2764, 53.1685)
  point P17 (23.1794, 53.5189)
  point P18 (21.5574, 54.2619)
  point P19 (20.447, 55.336)
  point P20 (19.9671, 56.4765)
  point P21 (20.2871, 59.0572)
  point P22 (22.4689, 61.0346)
  point P23 (26.4542, 61.1331)
  point P24 (29.0183, 59.8364)
  point P25 (11.4211, 48.5559)
  point P26 (9.78, 50.5097)
  point P27 (9.4515, 53.0365)
  point P28 (9.8728, 54.8339)
  point P29 (11.0323, 56.3265)
  point P30 (12.7057, 51.0411)
  point P31 (12.0375, 52.3737)
  point P32 (12.4422, 53.8787)
  point P33 (-27.7836, 51.2654)
  point P34 (-3.281, 55.4892)
extrude "SP RITE Logo" [suppressed]
equation "\"d2\" = width"
equation "\"d94\" = d92"
equation "\"d95\" = HoleDia"
equation "\"d105\" = HoleDia"
equation "\"d125\" = HoleDia"
equation "\"d135\" = HoleDia"
equation "\"HoleDia\" = 3.4"
properties part number "top plate"
